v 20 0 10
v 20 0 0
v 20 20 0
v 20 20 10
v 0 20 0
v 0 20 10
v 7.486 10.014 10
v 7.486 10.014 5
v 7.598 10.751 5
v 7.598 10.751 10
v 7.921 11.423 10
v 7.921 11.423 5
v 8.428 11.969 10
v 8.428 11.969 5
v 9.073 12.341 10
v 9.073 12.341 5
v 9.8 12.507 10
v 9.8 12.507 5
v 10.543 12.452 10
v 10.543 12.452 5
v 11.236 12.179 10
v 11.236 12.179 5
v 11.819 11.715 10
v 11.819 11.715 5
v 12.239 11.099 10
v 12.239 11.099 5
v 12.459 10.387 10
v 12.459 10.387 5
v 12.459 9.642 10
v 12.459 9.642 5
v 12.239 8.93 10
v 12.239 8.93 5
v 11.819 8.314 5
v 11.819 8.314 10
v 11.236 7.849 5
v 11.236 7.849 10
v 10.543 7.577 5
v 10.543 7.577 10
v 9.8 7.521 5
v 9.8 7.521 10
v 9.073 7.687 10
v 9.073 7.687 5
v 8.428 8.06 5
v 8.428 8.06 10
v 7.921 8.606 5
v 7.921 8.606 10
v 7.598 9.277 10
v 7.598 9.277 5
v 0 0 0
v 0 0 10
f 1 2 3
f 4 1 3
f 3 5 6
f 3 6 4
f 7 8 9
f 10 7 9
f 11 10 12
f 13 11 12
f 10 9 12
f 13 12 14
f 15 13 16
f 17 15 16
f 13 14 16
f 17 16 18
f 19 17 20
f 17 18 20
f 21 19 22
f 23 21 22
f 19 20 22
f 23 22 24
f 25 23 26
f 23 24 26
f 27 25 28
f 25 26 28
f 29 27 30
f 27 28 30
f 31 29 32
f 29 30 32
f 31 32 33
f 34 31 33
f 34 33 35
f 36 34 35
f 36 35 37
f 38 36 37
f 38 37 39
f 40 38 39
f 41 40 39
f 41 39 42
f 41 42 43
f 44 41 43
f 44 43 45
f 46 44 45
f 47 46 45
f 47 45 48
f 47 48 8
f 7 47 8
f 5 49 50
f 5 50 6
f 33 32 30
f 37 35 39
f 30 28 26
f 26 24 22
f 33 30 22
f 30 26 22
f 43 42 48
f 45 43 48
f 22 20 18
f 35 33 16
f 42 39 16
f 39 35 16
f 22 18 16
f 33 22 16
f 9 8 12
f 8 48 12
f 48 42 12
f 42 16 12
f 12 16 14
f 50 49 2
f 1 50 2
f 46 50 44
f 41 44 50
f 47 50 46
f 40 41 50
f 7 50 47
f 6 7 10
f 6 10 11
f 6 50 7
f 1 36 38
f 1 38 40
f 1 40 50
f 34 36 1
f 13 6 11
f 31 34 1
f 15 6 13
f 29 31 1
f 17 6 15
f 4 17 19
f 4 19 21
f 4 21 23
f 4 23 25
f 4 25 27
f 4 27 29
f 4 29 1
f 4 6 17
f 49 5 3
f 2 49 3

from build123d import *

# Parameters (mm, degrees)
SKETCH_1_W          = 20
SKETCH_1_H          = 20
BASEBOX_DEPTH       = 10
HOLE_WIZARD_1_D     = 5
HOLE_WIZARD_1_DEPTH = 5


with BuildPart() as part:
    # 草图1 → BaseBox (new body)
    with BuildSketch(Plane.XY):
        with Locations((10, 10)):
            Rectangle(SKETCH_1_W, SKETCH_1_H)
    extrude(amount=BASEBOX_DEPTH)

    # 孔1
    with Locations(Plane.XY.offset(10)):
        with Locations((9.986487375, 10.014305599)):
            Hole(HOLE_WIZARD_1_D / 2, depth=HOLE_WIZARD_1_DEPTH)


solid = part.part
